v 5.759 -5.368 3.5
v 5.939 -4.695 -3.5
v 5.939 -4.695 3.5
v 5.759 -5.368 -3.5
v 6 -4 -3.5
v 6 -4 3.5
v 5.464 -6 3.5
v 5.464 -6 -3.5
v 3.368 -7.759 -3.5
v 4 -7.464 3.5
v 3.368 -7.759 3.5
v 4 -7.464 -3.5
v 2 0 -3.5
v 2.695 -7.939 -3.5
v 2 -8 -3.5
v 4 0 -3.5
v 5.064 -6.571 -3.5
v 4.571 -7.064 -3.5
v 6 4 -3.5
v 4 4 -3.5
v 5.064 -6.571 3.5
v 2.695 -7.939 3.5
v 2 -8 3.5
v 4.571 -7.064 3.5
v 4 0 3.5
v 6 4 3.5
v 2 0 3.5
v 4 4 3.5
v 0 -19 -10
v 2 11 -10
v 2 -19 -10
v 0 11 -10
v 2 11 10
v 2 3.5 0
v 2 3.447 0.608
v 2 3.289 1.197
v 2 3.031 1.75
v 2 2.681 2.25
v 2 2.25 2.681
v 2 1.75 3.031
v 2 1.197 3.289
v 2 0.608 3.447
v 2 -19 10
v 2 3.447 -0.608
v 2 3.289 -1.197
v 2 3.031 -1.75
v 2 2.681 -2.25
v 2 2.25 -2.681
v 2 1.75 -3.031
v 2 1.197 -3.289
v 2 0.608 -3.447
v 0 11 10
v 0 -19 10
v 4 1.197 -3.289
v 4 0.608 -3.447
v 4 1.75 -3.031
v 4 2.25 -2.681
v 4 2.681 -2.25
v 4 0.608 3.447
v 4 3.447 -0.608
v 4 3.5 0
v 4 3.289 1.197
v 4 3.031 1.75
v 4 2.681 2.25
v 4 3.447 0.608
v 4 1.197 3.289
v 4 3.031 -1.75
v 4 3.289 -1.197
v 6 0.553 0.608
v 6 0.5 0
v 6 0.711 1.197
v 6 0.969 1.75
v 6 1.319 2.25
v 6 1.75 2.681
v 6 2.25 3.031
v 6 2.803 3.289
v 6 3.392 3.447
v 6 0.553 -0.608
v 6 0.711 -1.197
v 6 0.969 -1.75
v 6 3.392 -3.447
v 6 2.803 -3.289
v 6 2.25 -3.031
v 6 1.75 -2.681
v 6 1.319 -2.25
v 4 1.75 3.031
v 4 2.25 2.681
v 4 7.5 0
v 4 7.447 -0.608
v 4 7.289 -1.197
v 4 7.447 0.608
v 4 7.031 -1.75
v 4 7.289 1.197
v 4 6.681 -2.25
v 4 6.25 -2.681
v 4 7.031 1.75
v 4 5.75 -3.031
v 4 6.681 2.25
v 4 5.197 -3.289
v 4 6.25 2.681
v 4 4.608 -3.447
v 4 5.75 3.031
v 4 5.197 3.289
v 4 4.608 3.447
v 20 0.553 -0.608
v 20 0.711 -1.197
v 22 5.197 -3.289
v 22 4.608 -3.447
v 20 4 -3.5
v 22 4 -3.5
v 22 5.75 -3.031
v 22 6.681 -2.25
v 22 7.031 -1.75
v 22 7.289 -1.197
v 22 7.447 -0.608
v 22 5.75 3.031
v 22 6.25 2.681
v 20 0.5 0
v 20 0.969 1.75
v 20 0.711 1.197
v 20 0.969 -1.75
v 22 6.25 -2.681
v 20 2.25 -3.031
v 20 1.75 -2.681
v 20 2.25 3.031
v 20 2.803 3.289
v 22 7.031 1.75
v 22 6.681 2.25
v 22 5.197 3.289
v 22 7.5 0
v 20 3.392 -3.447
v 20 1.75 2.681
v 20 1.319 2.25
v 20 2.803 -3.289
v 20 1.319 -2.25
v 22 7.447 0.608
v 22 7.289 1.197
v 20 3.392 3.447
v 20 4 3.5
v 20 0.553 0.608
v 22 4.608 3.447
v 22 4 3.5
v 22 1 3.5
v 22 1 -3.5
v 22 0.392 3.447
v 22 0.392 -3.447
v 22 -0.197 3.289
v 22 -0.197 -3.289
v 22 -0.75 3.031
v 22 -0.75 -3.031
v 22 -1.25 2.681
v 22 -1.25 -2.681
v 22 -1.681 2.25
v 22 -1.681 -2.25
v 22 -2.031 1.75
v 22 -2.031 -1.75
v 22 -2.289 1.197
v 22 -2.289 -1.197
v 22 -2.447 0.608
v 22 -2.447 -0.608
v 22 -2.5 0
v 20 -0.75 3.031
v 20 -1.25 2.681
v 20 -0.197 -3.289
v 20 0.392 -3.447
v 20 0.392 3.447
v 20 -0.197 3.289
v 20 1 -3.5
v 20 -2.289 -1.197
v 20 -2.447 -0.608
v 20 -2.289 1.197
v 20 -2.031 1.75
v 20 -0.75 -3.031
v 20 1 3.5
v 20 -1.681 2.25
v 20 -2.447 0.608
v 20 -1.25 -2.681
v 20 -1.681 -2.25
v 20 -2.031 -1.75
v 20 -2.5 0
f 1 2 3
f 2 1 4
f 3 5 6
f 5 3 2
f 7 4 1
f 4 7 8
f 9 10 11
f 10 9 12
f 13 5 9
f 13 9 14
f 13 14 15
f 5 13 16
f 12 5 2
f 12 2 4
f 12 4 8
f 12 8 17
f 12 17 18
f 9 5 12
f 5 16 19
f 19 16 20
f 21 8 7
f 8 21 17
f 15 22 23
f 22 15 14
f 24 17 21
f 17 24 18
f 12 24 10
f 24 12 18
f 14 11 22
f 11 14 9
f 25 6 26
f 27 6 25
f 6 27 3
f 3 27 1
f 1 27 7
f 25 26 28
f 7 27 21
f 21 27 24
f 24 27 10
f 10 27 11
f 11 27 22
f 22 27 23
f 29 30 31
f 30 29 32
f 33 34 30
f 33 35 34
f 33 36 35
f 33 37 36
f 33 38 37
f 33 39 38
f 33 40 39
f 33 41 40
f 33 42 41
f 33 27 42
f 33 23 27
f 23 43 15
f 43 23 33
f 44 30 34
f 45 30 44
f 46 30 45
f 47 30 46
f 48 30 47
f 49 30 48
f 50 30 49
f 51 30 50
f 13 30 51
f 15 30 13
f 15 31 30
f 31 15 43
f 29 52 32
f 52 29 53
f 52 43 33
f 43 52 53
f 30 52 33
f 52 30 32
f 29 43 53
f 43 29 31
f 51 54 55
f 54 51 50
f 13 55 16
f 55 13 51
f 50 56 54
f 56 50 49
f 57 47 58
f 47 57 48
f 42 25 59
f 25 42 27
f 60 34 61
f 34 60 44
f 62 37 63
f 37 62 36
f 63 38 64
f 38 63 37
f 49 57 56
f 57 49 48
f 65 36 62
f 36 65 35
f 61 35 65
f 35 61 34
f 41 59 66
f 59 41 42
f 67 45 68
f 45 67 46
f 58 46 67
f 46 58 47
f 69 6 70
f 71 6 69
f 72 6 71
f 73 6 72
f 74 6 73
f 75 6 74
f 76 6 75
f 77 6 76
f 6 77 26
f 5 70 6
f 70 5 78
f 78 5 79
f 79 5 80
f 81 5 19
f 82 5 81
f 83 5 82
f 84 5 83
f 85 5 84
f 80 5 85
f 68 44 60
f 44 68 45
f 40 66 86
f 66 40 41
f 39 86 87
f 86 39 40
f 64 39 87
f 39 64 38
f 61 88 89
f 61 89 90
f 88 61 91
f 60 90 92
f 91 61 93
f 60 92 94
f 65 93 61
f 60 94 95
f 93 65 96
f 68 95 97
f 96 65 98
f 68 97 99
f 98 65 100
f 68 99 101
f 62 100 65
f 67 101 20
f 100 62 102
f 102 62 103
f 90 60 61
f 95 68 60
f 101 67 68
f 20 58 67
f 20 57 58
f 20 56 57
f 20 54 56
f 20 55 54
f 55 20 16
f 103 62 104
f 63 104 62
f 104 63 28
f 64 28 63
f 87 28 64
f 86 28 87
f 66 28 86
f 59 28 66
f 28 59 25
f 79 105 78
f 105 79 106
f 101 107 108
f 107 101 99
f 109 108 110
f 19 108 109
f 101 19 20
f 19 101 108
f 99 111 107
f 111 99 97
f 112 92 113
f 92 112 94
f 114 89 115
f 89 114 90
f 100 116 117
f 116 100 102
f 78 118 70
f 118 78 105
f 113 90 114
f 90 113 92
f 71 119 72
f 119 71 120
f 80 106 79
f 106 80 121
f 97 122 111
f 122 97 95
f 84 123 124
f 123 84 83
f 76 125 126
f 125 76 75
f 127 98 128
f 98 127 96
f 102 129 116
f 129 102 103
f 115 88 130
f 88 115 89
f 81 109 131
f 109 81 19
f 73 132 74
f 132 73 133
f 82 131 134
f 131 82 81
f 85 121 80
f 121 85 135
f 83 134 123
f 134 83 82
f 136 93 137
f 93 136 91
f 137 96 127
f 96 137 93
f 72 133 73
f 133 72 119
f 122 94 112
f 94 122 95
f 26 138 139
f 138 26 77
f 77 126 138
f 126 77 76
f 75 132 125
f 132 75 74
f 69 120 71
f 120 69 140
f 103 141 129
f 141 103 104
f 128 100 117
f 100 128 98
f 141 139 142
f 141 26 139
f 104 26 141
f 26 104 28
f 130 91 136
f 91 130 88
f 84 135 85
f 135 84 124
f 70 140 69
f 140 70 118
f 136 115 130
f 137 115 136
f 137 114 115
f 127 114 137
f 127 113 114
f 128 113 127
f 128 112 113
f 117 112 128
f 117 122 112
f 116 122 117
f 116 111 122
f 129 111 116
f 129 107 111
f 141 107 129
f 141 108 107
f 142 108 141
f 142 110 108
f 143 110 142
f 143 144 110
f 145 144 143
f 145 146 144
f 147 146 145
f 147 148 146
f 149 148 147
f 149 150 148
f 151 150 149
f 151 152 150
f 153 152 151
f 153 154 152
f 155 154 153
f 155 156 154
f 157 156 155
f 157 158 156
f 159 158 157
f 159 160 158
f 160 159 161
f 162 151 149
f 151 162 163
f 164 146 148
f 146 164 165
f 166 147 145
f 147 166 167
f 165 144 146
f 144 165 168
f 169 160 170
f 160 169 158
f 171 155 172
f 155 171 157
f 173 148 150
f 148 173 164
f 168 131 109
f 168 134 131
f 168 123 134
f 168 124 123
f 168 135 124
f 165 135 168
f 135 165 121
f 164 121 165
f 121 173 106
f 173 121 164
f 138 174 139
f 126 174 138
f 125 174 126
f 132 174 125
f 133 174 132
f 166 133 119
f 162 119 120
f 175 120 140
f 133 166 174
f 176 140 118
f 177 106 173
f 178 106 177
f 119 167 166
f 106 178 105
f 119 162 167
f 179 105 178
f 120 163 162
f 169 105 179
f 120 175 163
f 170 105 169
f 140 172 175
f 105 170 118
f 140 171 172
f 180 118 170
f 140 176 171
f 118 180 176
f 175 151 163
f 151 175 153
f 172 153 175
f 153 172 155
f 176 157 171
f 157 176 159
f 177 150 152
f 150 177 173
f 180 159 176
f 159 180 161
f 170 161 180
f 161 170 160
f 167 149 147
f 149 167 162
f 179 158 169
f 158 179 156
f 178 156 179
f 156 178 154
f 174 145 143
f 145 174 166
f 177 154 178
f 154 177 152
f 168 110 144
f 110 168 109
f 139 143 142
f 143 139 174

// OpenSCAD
// hook for angle rack
// ver.140615 by junnno

// the width of the back plate
base_width = 20;
// the height of the back plate
base_height = 30;
// the thickness of the back plate
base_thickness = 2;

// the thickness of the groove hooking on angle body
hook_groove_gap = 2;
// the depth of the groove hooking on angle body
hook_groove_depth = 4;
// the theckness of the part connecting the hook root and the arm
hook_transition_length = 2;
// the height of the root block to restrict rotation
hook_block_height = 4;

// the diameter of the arm
arm_diameter = 7;
// the length of the arm from the edge of the groove to the most tip
arm_length = 18;
// the height of the bump at the arm tip
arm_tip_height = 3;
// the length of the bump at the arm tip
arm_tip_length = 2;

// the horizontal offset of the arm root from the center of the base plate
arm_offset_horizontal = 0;
// the vertical offset of the arm root from the center of the base plate
arm_offset_vertical = 4;

$fn = 36;

module quater_cylinder(h=1,r=1,intrusion=0)
{
	intersection(){
		cylinder(h=h, r=r);
		translate([-intrusion,-intrusion,-1]) cube([r+1+intrusion,r+1+intrusion,h+2],center=false);
	}
}
//#quater_cylinder(10,10);

module hook01()
{
	// the base plate
	translate([-arm_offset_horizontal,-arm_offset_vertical,base_thickness/2])
		cube([base_width, base_height, base_thickness], center = true);

	// the hook area of the arm
	translate([0,0,base_thickness])
		cylinder(h = hook_groove_gap + hook_transition_length, r = arm_diameter/2);
	translate([0,hook_groove_depth/2,base_thickness+hook_groove_gap+hook_transition_length/2])
		cube([arm_diameter,abs(hook_groove_depth),hook_transition_length], center = true);
	
	// the hook block
	translate([0,-hook_block_height/2, base_thickness+(hook_groove_gap+hook_transition_length)/2])
		cube([arm_diameter,hook_block_height,hook_groove_gap+hook_transition_length], center = true);
	translate([-arm_diameter/2, -hook_block_height, base_thickness])
		rotate([-90,-90,-90])
			quater_cylinder(h=arm_diameter,r=hook_groove_gap+hook_transition_length,intrusion=0.1);
	
	// the body of the arm
	translate([0,hook_groove_depth,base_thickness+hook_groove_gap])
		cylinder(h = arm_length, r = arm_diameter/2);

	// the tip of the arm
	translate([0,hook_groove_depth-arm_tip_height,base_thickness+hook_groove_gap+arm_length-arm_tip_length])
		cylinder(h = arm_tip_length, r = arm_diameter/2);
	translate([0,hook_groove_depth-arm_tip_height/2,base_thickness+hook_groove_gap+arm_length-arm_tip_length/2])
		cube([arm_diameter,abs(arm_tip_height),arm_tip_length], center = true);
		
}

rotate([0,90,0])
	hook01();

